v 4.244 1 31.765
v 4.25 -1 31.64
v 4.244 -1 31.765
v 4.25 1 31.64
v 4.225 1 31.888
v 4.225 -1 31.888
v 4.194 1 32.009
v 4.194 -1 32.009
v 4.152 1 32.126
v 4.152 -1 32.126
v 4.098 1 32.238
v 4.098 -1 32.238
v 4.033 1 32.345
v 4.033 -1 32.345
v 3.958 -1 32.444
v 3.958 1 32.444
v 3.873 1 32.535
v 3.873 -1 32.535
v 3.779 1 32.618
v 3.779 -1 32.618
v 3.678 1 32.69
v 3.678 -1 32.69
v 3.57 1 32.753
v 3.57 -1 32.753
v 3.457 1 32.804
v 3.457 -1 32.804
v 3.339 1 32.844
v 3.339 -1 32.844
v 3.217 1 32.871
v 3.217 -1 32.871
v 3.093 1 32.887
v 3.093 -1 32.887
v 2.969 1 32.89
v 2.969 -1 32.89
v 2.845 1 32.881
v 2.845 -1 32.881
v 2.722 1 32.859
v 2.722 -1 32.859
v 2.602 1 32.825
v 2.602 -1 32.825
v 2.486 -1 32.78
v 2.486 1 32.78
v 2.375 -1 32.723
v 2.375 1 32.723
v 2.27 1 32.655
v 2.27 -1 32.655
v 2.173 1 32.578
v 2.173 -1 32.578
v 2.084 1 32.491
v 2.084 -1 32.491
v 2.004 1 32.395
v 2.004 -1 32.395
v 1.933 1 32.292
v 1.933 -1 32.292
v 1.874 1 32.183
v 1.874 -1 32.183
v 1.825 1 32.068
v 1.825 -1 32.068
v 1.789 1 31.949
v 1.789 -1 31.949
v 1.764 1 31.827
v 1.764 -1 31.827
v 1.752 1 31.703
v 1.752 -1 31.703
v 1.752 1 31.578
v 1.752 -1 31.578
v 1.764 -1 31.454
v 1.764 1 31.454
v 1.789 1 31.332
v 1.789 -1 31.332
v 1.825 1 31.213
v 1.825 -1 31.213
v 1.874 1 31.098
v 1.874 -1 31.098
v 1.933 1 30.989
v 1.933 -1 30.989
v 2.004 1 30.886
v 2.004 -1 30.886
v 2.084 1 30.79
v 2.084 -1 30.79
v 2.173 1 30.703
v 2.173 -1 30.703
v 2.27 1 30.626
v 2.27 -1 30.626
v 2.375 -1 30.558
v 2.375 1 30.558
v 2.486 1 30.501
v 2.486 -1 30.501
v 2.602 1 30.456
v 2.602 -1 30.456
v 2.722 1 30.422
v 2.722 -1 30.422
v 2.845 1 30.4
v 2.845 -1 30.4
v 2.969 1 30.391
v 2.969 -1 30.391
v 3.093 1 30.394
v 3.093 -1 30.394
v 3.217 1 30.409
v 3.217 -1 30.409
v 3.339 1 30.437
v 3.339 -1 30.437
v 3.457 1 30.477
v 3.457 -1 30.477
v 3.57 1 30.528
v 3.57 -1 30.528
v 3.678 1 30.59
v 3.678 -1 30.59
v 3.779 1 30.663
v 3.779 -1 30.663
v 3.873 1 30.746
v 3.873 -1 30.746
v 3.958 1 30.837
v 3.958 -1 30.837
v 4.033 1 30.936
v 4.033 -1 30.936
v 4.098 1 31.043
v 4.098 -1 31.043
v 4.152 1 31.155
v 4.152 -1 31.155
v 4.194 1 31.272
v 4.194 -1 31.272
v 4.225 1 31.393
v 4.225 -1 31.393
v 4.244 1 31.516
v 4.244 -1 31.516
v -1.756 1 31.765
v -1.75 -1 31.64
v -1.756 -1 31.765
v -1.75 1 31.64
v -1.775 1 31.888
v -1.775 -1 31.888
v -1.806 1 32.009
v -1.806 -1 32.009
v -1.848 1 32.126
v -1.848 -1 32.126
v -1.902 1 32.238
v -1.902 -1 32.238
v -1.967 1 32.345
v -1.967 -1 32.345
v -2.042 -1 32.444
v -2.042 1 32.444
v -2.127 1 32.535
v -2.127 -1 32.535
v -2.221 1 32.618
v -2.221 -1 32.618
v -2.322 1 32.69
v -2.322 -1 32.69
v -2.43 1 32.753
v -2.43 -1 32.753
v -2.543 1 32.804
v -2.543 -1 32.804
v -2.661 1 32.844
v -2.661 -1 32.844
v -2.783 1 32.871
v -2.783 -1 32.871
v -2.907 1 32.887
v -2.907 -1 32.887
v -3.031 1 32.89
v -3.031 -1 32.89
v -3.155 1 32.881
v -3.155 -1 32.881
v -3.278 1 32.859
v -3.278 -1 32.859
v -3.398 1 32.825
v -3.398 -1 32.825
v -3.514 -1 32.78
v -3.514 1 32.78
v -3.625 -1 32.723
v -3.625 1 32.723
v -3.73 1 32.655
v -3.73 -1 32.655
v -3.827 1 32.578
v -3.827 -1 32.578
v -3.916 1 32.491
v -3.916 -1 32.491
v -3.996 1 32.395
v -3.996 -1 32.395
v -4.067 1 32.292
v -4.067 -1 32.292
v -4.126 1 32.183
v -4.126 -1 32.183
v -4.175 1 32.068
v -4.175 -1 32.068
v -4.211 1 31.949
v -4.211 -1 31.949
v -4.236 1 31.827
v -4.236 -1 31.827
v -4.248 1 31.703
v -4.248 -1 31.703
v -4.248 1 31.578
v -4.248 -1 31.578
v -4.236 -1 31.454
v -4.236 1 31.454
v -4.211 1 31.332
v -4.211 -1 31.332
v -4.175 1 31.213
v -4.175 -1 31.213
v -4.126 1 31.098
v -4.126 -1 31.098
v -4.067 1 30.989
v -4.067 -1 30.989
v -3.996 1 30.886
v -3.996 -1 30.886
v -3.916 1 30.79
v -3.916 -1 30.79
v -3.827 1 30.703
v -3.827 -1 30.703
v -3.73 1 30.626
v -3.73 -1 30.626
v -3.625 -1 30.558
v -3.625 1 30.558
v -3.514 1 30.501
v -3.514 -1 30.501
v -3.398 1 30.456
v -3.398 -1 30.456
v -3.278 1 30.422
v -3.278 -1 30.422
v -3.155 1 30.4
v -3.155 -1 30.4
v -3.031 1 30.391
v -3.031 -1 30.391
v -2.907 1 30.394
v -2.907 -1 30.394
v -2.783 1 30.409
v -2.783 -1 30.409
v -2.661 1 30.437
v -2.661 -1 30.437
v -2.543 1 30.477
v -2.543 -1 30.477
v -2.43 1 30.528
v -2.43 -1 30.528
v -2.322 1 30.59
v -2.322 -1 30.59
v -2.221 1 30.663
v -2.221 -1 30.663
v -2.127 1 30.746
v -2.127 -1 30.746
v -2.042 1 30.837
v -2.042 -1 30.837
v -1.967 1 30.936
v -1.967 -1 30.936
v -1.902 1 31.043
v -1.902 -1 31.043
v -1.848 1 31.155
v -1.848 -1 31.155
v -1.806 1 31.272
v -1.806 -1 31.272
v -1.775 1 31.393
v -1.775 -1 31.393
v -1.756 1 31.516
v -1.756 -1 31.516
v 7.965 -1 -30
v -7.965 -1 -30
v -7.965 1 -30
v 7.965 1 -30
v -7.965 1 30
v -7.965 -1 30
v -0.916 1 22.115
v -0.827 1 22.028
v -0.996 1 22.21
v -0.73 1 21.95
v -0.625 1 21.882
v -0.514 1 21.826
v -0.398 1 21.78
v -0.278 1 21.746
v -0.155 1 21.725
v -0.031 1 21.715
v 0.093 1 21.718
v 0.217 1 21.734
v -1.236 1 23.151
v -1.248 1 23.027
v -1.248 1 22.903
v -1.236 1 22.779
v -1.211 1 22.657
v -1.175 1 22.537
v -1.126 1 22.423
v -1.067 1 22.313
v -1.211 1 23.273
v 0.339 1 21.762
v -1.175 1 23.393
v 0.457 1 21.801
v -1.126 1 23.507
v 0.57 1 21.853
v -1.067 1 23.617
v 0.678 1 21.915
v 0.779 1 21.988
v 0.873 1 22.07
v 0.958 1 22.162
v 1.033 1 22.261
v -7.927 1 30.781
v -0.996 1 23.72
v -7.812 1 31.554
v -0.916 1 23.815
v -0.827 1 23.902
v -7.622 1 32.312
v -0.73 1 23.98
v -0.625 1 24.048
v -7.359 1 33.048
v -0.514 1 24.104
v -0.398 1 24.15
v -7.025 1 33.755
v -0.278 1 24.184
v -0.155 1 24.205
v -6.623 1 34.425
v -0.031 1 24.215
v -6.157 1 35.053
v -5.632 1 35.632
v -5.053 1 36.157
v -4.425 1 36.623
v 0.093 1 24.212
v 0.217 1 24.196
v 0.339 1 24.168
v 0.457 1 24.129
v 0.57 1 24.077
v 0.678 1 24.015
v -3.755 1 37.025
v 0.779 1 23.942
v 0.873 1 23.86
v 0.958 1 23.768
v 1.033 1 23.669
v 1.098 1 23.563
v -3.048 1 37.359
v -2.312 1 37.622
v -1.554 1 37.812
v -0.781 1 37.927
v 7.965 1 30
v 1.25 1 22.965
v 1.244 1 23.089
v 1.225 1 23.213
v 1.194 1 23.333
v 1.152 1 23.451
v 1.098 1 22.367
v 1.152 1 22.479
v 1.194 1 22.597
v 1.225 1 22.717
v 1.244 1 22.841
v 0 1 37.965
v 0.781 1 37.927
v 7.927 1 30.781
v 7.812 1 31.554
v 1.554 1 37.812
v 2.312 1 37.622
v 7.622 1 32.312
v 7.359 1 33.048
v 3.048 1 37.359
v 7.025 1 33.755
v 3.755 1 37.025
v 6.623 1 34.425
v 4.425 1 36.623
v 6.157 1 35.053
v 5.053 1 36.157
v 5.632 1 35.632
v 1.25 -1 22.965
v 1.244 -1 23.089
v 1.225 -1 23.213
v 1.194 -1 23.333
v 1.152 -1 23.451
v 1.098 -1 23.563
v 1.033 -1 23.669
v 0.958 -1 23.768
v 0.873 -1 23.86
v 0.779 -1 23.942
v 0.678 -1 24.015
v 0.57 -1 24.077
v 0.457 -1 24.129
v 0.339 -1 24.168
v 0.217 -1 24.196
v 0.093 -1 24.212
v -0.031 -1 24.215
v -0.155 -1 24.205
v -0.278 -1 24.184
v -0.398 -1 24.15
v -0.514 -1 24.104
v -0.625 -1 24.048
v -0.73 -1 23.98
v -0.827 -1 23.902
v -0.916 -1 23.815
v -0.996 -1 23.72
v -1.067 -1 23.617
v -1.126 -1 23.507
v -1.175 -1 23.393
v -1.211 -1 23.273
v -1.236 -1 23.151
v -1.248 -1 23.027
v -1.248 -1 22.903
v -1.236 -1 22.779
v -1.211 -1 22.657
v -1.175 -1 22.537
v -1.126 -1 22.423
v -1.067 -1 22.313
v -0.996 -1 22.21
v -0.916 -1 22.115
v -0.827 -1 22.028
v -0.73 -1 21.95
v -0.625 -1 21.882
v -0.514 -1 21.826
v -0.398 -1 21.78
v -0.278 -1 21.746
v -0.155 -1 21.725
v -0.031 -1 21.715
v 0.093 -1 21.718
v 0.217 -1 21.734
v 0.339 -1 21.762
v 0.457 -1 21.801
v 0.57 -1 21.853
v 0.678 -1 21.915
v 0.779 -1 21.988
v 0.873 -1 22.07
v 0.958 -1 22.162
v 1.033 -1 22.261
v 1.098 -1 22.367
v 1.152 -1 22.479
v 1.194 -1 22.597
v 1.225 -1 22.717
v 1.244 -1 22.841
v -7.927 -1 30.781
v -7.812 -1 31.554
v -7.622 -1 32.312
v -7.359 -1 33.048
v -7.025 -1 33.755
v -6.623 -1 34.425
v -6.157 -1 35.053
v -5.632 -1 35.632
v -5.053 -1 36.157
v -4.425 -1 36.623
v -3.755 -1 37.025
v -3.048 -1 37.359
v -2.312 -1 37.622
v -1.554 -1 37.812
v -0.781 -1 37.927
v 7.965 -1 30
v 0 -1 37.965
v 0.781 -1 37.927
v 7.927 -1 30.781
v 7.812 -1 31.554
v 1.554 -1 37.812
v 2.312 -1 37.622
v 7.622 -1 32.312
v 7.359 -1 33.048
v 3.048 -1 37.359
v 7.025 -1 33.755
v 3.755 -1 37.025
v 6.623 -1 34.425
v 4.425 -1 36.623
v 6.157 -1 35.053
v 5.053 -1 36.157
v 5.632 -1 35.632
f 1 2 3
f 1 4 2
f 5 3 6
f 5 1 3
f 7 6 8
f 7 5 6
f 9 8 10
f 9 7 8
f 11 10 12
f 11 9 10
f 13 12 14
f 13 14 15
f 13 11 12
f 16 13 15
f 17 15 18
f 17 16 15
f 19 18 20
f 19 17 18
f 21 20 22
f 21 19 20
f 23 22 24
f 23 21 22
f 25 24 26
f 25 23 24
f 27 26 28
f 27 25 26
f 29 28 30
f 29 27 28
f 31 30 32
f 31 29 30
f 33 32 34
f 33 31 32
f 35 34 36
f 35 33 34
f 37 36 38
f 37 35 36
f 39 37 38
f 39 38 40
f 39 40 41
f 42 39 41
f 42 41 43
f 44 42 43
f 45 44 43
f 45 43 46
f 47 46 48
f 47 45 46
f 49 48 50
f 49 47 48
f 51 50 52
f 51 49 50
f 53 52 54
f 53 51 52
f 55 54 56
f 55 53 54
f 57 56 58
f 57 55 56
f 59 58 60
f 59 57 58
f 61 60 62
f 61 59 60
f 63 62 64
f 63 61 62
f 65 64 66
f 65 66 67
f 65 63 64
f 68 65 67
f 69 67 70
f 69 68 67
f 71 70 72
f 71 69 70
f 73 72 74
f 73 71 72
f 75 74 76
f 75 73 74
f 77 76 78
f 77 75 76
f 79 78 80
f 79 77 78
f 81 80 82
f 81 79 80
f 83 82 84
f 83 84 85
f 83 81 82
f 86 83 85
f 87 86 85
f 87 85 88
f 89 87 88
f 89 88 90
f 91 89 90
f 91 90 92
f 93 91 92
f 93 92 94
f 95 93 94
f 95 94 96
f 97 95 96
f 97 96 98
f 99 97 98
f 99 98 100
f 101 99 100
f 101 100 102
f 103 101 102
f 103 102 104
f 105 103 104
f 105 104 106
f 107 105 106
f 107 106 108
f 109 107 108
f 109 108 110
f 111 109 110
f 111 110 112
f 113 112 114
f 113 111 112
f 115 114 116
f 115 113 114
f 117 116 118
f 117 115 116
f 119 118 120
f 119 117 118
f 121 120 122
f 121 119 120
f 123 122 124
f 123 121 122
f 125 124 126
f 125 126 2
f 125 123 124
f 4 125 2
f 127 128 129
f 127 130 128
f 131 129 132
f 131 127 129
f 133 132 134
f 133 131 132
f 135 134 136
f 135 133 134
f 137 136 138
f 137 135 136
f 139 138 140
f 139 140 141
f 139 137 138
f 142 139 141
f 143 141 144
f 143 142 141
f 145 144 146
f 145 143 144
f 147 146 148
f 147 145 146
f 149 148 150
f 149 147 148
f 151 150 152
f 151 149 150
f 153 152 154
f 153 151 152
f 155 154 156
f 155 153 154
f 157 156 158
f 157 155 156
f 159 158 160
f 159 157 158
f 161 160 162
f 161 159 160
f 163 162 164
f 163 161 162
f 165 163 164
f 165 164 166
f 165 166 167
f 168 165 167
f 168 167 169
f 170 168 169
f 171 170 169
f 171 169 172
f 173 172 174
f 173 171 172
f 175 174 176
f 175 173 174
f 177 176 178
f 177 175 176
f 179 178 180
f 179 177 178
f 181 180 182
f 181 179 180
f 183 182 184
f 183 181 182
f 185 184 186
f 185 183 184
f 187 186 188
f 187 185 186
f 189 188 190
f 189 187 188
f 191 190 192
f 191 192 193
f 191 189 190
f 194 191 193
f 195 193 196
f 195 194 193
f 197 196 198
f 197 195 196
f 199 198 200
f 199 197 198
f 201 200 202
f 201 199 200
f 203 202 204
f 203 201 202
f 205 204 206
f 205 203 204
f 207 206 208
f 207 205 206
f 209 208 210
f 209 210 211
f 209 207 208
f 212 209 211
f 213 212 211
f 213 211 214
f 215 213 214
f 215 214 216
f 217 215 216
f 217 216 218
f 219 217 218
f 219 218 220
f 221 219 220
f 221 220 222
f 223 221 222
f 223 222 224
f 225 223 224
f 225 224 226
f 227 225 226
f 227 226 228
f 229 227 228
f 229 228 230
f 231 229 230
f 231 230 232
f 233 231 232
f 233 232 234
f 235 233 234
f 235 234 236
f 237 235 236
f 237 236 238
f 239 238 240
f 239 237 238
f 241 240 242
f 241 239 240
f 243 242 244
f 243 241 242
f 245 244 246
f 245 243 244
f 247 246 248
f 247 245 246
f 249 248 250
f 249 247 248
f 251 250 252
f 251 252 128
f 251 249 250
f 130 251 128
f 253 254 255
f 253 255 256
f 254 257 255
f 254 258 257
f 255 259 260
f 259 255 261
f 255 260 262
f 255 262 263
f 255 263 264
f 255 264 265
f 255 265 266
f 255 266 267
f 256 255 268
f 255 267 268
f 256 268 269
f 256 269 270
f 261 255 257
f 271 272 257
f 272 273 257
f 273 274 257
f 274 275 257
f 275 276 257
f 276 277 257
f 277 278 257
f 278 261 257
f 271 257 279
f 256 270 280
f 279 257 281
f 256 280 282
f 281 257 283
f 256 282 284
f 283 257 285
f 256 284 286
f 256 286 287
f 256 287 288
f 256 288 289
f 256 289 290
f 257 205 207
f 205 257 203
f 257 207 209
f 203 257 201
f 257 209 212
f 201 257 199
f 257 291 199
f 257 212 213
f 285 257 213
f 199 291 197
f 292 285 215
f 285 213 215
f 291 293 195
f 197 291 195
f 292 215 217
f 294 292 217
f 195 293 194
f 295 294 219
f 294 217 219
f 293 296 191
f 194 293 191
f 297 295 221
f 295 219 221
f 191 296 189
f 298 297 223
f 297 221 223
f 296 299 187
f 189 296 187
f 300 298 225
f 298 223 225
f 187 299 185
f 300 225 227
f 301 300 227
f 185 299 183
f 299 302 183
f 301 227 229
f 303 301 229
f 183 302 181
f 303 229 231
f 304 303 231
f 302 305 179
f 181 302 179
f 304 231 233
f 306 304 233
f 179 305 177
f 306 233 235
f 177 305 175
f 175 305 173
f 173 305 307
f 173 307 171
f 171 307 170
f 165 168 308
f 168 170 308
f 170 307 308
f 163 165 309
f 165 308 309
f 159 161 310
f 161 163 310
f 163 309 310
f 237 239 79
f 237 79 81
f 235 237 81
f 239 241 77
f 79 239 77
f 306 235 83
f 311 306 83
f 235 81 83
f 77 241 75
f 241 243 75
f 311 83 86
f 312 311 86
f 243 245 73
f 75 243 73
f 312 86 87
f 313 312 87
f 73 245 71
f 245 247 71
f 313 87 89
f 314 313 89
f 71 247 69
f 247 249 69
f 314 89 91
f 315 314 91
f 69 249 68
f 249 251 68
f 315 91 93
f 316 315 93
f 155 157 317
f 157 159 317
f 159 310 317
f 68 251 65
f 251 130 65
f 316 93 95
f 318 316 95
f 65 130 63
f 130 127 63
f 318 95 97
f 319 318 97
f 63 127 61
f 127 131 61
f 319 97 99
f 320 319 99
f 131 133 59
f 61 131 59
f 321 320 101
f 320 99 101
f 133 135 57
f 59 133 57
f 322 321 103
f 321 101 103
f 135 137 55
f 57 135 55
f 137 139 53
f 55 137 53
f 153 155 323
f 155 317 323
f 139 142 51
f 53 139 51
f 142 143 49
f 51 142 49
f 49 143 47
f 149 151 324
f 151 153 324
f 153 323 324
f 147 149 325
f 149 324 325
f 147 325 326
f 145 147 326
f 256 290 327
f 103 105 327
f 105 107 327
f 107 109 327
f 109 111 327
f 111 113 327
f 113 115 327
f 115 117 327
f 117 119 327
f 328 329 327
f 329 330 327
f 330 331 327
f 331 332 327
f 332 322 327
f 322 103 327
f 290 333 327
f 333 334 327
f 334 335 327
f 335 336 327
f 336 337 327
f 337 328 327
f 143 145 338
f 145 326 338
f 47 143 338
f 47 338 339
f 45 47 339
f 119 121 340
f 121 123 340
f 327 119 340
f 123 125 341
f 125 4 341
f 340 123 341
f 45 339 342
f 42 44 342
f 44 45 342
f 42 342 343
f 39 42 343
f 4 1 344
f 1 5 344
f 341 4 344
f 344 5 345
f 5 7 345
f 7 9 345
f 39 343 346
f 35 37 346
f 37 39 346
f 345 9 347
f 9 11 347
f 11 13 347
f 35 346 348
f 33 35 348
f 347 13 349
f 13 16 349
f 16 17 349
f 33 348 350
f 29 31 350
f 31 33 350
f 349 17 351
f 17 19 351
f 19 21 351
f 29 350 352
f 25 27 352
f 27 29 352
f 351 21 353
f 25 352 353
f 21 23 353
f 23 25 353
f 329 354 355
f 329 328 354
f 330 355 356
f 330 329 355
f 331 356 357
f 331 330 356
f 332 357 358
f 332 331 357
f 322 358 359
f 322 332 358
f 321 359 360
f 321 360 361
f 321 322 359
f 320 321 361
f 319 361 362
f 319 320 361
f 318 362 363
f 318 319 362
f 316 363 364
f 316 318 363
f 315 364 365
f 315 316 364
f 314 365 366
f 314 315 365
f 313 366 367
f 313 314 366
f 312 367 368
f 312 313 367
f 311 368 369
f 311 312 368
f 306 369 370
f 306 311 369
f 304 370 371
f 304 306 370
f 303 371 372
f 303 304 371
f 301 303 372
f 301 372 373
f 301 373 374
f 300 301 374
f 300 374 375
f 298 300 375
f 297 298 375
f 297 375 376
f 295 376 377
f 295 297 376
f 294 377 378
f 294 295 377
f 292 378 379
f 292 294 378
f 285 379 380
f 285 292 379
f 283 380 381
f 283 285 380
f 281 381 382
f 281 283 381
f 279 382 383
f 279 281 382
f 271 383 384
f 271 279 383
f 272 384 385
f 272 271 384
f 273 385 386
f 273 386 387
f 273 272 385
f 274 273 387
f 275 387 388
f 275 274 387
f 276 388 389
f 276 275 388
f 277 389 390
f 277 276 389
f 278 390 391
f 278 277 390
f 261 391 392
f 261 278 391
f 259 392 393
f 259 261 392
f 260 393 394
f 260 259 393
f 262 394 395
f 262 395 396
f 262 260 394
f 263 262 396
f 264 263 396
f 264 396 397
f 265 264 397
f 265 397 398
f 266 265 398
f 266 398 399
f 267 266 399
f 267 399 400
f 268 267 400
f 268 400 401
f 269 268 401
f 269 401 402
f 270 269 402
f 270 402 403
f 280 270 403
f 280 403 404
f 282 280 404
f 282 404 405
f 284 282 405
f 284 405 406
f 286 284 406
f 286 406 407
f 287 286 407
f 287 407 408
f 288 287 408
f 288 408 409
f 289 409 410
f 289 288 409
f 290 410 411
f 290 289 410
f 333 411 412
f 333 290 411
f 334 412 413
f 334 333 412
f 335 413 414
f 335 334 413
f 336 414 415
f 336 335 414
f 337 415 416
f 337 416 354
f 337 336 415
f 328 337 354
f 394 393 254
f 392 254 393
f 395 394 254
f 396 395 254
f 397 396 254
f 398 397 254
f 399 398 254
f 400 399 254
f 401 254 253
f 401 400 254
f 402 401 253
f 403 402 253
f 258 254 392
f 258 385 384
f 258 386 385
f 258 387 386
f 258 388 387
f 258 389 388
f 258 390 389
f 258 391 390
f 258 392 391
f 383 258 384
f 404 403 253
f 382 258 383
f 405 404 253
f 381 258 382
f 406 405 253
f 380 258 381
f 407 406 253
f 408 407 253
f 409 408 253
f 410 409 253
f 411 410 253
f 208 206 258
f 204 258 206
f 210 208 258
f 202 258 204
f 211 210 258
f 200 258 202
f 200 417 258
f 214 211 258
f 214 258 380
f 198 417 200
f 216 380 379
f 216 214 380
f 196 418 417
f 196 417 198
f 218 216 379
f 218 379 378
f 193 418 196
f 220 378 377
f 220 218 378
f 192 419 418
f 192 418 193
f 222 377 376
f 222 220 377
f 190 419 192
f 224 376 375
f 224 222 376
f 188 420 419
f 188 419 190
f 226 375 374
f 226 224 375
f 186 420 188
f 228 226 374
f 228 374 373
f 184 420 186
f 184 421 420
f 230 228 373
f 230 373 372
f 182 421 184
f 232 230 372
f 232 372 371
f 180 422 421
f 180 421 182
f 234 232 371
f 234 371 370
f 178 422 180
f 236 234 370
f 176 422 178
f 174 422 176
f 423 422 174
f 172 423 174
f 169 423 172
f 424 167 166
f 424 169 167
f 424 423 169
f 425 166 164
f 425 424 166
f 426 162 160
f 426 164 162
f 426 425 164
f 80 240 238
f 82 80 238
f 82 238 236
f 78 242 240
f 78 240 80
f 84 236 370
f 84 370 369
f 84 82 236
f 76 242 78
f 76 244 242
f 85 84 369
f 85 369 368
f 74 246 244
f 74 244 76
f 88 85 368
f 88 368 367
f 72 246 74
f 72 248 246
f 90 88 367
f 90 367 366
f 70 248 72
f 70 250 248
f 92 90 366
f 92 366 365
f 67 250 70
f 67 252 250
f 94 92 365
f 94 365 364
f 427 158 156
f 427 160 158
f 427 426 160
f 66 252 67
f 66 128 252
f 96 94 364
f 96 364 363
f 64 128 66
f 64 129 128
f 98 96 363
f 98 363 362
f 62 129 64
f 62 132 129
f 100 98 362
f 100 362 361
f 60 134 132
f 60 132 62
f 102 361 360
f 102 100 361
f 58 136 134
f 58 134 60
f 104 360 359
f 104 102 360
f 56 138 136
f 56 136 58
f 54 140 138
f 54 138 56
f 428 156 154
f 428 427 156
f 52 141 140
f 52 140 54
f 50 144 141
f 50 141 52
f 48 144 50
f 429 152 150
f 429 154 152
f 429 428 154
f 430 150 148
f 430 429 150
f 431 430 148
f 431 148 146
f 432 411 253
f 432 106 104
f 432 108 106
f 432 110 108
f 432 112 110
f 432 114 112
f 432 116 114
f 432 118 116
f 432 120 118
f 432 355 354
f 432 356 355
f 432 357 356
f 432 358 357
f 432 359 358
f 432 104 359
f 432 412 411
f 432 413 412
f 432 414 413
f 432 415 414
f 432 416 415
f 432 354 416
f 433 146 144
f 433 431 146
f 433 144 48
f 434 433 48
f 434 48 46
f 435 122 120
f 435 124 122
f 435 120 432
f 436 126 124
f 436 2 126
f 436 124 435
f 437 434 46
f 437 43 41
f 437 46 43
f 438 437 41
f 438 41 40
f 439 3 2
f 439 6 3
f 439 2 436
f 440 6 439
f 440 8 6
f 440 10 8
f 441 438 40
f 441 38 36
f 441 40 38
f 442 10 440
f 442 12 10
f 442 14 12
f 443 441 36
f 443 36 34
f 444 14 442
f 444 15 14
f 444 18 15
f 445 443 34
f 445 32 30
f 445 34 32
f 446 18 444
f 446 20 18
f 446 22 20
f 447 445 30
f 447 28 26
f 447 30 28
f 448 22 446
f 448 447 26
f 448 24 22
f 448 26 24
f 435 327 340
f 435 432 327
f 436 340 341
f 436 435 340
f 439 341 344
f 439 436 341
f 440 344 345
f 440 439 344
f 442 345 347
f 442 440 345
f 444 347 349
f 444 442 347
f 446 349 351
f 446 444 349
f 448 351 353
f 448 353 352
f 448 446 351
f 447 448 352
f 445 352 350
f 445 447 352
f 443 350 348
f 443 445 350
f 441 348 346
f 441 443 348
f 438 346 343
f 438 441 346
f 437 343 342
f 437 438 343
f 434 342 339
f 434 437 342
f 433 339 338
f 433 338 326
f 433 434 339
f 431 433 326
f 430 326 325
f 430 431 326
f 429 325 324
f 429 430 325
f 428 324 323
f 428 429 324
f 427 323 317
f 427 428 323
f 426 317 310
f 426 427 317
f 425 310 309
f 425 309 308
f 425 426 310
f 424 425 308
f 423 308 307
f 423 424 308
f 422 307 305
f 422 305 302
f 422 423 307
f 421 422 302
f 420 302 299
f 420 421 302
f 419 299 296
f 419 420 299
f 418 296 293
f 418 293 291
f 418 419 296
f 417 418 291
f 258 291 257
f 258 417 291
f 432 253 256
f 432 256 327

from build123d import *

# Parameters (mm, degrees)
F0_R     = 1.25
F1_DEPTH = 1


with BuildPart() as f1:
    # F0 (on Front) → F1 (new body, symmetric)
    with BuildSketch(Plane.XZ):
        with BuildLine():
            Line((-7.965, 30), (-7.965, -30))
            Line((-7.965, -30), (7.965, -30))
            Line((7.965, -30), (7.965, 30))
            ThreePointArc((7.965, 30), (0, 37.965), (-7.965, 30))
        make_face()
        with Locations((-3, 31.640445)):
            Circle(F0_R, mode=Mode.SUBTRACT)
        with Locations((0, 22.965)):
            Circle(F0_R, mode=Mode.SUBTRACT)
        with Locations((3, 31.640445)):
            Circle(F0_R, mode=Mode.SUBTRACT)
    extrude(amount=F1_DEPTH, both=True)


solid = f1.part
